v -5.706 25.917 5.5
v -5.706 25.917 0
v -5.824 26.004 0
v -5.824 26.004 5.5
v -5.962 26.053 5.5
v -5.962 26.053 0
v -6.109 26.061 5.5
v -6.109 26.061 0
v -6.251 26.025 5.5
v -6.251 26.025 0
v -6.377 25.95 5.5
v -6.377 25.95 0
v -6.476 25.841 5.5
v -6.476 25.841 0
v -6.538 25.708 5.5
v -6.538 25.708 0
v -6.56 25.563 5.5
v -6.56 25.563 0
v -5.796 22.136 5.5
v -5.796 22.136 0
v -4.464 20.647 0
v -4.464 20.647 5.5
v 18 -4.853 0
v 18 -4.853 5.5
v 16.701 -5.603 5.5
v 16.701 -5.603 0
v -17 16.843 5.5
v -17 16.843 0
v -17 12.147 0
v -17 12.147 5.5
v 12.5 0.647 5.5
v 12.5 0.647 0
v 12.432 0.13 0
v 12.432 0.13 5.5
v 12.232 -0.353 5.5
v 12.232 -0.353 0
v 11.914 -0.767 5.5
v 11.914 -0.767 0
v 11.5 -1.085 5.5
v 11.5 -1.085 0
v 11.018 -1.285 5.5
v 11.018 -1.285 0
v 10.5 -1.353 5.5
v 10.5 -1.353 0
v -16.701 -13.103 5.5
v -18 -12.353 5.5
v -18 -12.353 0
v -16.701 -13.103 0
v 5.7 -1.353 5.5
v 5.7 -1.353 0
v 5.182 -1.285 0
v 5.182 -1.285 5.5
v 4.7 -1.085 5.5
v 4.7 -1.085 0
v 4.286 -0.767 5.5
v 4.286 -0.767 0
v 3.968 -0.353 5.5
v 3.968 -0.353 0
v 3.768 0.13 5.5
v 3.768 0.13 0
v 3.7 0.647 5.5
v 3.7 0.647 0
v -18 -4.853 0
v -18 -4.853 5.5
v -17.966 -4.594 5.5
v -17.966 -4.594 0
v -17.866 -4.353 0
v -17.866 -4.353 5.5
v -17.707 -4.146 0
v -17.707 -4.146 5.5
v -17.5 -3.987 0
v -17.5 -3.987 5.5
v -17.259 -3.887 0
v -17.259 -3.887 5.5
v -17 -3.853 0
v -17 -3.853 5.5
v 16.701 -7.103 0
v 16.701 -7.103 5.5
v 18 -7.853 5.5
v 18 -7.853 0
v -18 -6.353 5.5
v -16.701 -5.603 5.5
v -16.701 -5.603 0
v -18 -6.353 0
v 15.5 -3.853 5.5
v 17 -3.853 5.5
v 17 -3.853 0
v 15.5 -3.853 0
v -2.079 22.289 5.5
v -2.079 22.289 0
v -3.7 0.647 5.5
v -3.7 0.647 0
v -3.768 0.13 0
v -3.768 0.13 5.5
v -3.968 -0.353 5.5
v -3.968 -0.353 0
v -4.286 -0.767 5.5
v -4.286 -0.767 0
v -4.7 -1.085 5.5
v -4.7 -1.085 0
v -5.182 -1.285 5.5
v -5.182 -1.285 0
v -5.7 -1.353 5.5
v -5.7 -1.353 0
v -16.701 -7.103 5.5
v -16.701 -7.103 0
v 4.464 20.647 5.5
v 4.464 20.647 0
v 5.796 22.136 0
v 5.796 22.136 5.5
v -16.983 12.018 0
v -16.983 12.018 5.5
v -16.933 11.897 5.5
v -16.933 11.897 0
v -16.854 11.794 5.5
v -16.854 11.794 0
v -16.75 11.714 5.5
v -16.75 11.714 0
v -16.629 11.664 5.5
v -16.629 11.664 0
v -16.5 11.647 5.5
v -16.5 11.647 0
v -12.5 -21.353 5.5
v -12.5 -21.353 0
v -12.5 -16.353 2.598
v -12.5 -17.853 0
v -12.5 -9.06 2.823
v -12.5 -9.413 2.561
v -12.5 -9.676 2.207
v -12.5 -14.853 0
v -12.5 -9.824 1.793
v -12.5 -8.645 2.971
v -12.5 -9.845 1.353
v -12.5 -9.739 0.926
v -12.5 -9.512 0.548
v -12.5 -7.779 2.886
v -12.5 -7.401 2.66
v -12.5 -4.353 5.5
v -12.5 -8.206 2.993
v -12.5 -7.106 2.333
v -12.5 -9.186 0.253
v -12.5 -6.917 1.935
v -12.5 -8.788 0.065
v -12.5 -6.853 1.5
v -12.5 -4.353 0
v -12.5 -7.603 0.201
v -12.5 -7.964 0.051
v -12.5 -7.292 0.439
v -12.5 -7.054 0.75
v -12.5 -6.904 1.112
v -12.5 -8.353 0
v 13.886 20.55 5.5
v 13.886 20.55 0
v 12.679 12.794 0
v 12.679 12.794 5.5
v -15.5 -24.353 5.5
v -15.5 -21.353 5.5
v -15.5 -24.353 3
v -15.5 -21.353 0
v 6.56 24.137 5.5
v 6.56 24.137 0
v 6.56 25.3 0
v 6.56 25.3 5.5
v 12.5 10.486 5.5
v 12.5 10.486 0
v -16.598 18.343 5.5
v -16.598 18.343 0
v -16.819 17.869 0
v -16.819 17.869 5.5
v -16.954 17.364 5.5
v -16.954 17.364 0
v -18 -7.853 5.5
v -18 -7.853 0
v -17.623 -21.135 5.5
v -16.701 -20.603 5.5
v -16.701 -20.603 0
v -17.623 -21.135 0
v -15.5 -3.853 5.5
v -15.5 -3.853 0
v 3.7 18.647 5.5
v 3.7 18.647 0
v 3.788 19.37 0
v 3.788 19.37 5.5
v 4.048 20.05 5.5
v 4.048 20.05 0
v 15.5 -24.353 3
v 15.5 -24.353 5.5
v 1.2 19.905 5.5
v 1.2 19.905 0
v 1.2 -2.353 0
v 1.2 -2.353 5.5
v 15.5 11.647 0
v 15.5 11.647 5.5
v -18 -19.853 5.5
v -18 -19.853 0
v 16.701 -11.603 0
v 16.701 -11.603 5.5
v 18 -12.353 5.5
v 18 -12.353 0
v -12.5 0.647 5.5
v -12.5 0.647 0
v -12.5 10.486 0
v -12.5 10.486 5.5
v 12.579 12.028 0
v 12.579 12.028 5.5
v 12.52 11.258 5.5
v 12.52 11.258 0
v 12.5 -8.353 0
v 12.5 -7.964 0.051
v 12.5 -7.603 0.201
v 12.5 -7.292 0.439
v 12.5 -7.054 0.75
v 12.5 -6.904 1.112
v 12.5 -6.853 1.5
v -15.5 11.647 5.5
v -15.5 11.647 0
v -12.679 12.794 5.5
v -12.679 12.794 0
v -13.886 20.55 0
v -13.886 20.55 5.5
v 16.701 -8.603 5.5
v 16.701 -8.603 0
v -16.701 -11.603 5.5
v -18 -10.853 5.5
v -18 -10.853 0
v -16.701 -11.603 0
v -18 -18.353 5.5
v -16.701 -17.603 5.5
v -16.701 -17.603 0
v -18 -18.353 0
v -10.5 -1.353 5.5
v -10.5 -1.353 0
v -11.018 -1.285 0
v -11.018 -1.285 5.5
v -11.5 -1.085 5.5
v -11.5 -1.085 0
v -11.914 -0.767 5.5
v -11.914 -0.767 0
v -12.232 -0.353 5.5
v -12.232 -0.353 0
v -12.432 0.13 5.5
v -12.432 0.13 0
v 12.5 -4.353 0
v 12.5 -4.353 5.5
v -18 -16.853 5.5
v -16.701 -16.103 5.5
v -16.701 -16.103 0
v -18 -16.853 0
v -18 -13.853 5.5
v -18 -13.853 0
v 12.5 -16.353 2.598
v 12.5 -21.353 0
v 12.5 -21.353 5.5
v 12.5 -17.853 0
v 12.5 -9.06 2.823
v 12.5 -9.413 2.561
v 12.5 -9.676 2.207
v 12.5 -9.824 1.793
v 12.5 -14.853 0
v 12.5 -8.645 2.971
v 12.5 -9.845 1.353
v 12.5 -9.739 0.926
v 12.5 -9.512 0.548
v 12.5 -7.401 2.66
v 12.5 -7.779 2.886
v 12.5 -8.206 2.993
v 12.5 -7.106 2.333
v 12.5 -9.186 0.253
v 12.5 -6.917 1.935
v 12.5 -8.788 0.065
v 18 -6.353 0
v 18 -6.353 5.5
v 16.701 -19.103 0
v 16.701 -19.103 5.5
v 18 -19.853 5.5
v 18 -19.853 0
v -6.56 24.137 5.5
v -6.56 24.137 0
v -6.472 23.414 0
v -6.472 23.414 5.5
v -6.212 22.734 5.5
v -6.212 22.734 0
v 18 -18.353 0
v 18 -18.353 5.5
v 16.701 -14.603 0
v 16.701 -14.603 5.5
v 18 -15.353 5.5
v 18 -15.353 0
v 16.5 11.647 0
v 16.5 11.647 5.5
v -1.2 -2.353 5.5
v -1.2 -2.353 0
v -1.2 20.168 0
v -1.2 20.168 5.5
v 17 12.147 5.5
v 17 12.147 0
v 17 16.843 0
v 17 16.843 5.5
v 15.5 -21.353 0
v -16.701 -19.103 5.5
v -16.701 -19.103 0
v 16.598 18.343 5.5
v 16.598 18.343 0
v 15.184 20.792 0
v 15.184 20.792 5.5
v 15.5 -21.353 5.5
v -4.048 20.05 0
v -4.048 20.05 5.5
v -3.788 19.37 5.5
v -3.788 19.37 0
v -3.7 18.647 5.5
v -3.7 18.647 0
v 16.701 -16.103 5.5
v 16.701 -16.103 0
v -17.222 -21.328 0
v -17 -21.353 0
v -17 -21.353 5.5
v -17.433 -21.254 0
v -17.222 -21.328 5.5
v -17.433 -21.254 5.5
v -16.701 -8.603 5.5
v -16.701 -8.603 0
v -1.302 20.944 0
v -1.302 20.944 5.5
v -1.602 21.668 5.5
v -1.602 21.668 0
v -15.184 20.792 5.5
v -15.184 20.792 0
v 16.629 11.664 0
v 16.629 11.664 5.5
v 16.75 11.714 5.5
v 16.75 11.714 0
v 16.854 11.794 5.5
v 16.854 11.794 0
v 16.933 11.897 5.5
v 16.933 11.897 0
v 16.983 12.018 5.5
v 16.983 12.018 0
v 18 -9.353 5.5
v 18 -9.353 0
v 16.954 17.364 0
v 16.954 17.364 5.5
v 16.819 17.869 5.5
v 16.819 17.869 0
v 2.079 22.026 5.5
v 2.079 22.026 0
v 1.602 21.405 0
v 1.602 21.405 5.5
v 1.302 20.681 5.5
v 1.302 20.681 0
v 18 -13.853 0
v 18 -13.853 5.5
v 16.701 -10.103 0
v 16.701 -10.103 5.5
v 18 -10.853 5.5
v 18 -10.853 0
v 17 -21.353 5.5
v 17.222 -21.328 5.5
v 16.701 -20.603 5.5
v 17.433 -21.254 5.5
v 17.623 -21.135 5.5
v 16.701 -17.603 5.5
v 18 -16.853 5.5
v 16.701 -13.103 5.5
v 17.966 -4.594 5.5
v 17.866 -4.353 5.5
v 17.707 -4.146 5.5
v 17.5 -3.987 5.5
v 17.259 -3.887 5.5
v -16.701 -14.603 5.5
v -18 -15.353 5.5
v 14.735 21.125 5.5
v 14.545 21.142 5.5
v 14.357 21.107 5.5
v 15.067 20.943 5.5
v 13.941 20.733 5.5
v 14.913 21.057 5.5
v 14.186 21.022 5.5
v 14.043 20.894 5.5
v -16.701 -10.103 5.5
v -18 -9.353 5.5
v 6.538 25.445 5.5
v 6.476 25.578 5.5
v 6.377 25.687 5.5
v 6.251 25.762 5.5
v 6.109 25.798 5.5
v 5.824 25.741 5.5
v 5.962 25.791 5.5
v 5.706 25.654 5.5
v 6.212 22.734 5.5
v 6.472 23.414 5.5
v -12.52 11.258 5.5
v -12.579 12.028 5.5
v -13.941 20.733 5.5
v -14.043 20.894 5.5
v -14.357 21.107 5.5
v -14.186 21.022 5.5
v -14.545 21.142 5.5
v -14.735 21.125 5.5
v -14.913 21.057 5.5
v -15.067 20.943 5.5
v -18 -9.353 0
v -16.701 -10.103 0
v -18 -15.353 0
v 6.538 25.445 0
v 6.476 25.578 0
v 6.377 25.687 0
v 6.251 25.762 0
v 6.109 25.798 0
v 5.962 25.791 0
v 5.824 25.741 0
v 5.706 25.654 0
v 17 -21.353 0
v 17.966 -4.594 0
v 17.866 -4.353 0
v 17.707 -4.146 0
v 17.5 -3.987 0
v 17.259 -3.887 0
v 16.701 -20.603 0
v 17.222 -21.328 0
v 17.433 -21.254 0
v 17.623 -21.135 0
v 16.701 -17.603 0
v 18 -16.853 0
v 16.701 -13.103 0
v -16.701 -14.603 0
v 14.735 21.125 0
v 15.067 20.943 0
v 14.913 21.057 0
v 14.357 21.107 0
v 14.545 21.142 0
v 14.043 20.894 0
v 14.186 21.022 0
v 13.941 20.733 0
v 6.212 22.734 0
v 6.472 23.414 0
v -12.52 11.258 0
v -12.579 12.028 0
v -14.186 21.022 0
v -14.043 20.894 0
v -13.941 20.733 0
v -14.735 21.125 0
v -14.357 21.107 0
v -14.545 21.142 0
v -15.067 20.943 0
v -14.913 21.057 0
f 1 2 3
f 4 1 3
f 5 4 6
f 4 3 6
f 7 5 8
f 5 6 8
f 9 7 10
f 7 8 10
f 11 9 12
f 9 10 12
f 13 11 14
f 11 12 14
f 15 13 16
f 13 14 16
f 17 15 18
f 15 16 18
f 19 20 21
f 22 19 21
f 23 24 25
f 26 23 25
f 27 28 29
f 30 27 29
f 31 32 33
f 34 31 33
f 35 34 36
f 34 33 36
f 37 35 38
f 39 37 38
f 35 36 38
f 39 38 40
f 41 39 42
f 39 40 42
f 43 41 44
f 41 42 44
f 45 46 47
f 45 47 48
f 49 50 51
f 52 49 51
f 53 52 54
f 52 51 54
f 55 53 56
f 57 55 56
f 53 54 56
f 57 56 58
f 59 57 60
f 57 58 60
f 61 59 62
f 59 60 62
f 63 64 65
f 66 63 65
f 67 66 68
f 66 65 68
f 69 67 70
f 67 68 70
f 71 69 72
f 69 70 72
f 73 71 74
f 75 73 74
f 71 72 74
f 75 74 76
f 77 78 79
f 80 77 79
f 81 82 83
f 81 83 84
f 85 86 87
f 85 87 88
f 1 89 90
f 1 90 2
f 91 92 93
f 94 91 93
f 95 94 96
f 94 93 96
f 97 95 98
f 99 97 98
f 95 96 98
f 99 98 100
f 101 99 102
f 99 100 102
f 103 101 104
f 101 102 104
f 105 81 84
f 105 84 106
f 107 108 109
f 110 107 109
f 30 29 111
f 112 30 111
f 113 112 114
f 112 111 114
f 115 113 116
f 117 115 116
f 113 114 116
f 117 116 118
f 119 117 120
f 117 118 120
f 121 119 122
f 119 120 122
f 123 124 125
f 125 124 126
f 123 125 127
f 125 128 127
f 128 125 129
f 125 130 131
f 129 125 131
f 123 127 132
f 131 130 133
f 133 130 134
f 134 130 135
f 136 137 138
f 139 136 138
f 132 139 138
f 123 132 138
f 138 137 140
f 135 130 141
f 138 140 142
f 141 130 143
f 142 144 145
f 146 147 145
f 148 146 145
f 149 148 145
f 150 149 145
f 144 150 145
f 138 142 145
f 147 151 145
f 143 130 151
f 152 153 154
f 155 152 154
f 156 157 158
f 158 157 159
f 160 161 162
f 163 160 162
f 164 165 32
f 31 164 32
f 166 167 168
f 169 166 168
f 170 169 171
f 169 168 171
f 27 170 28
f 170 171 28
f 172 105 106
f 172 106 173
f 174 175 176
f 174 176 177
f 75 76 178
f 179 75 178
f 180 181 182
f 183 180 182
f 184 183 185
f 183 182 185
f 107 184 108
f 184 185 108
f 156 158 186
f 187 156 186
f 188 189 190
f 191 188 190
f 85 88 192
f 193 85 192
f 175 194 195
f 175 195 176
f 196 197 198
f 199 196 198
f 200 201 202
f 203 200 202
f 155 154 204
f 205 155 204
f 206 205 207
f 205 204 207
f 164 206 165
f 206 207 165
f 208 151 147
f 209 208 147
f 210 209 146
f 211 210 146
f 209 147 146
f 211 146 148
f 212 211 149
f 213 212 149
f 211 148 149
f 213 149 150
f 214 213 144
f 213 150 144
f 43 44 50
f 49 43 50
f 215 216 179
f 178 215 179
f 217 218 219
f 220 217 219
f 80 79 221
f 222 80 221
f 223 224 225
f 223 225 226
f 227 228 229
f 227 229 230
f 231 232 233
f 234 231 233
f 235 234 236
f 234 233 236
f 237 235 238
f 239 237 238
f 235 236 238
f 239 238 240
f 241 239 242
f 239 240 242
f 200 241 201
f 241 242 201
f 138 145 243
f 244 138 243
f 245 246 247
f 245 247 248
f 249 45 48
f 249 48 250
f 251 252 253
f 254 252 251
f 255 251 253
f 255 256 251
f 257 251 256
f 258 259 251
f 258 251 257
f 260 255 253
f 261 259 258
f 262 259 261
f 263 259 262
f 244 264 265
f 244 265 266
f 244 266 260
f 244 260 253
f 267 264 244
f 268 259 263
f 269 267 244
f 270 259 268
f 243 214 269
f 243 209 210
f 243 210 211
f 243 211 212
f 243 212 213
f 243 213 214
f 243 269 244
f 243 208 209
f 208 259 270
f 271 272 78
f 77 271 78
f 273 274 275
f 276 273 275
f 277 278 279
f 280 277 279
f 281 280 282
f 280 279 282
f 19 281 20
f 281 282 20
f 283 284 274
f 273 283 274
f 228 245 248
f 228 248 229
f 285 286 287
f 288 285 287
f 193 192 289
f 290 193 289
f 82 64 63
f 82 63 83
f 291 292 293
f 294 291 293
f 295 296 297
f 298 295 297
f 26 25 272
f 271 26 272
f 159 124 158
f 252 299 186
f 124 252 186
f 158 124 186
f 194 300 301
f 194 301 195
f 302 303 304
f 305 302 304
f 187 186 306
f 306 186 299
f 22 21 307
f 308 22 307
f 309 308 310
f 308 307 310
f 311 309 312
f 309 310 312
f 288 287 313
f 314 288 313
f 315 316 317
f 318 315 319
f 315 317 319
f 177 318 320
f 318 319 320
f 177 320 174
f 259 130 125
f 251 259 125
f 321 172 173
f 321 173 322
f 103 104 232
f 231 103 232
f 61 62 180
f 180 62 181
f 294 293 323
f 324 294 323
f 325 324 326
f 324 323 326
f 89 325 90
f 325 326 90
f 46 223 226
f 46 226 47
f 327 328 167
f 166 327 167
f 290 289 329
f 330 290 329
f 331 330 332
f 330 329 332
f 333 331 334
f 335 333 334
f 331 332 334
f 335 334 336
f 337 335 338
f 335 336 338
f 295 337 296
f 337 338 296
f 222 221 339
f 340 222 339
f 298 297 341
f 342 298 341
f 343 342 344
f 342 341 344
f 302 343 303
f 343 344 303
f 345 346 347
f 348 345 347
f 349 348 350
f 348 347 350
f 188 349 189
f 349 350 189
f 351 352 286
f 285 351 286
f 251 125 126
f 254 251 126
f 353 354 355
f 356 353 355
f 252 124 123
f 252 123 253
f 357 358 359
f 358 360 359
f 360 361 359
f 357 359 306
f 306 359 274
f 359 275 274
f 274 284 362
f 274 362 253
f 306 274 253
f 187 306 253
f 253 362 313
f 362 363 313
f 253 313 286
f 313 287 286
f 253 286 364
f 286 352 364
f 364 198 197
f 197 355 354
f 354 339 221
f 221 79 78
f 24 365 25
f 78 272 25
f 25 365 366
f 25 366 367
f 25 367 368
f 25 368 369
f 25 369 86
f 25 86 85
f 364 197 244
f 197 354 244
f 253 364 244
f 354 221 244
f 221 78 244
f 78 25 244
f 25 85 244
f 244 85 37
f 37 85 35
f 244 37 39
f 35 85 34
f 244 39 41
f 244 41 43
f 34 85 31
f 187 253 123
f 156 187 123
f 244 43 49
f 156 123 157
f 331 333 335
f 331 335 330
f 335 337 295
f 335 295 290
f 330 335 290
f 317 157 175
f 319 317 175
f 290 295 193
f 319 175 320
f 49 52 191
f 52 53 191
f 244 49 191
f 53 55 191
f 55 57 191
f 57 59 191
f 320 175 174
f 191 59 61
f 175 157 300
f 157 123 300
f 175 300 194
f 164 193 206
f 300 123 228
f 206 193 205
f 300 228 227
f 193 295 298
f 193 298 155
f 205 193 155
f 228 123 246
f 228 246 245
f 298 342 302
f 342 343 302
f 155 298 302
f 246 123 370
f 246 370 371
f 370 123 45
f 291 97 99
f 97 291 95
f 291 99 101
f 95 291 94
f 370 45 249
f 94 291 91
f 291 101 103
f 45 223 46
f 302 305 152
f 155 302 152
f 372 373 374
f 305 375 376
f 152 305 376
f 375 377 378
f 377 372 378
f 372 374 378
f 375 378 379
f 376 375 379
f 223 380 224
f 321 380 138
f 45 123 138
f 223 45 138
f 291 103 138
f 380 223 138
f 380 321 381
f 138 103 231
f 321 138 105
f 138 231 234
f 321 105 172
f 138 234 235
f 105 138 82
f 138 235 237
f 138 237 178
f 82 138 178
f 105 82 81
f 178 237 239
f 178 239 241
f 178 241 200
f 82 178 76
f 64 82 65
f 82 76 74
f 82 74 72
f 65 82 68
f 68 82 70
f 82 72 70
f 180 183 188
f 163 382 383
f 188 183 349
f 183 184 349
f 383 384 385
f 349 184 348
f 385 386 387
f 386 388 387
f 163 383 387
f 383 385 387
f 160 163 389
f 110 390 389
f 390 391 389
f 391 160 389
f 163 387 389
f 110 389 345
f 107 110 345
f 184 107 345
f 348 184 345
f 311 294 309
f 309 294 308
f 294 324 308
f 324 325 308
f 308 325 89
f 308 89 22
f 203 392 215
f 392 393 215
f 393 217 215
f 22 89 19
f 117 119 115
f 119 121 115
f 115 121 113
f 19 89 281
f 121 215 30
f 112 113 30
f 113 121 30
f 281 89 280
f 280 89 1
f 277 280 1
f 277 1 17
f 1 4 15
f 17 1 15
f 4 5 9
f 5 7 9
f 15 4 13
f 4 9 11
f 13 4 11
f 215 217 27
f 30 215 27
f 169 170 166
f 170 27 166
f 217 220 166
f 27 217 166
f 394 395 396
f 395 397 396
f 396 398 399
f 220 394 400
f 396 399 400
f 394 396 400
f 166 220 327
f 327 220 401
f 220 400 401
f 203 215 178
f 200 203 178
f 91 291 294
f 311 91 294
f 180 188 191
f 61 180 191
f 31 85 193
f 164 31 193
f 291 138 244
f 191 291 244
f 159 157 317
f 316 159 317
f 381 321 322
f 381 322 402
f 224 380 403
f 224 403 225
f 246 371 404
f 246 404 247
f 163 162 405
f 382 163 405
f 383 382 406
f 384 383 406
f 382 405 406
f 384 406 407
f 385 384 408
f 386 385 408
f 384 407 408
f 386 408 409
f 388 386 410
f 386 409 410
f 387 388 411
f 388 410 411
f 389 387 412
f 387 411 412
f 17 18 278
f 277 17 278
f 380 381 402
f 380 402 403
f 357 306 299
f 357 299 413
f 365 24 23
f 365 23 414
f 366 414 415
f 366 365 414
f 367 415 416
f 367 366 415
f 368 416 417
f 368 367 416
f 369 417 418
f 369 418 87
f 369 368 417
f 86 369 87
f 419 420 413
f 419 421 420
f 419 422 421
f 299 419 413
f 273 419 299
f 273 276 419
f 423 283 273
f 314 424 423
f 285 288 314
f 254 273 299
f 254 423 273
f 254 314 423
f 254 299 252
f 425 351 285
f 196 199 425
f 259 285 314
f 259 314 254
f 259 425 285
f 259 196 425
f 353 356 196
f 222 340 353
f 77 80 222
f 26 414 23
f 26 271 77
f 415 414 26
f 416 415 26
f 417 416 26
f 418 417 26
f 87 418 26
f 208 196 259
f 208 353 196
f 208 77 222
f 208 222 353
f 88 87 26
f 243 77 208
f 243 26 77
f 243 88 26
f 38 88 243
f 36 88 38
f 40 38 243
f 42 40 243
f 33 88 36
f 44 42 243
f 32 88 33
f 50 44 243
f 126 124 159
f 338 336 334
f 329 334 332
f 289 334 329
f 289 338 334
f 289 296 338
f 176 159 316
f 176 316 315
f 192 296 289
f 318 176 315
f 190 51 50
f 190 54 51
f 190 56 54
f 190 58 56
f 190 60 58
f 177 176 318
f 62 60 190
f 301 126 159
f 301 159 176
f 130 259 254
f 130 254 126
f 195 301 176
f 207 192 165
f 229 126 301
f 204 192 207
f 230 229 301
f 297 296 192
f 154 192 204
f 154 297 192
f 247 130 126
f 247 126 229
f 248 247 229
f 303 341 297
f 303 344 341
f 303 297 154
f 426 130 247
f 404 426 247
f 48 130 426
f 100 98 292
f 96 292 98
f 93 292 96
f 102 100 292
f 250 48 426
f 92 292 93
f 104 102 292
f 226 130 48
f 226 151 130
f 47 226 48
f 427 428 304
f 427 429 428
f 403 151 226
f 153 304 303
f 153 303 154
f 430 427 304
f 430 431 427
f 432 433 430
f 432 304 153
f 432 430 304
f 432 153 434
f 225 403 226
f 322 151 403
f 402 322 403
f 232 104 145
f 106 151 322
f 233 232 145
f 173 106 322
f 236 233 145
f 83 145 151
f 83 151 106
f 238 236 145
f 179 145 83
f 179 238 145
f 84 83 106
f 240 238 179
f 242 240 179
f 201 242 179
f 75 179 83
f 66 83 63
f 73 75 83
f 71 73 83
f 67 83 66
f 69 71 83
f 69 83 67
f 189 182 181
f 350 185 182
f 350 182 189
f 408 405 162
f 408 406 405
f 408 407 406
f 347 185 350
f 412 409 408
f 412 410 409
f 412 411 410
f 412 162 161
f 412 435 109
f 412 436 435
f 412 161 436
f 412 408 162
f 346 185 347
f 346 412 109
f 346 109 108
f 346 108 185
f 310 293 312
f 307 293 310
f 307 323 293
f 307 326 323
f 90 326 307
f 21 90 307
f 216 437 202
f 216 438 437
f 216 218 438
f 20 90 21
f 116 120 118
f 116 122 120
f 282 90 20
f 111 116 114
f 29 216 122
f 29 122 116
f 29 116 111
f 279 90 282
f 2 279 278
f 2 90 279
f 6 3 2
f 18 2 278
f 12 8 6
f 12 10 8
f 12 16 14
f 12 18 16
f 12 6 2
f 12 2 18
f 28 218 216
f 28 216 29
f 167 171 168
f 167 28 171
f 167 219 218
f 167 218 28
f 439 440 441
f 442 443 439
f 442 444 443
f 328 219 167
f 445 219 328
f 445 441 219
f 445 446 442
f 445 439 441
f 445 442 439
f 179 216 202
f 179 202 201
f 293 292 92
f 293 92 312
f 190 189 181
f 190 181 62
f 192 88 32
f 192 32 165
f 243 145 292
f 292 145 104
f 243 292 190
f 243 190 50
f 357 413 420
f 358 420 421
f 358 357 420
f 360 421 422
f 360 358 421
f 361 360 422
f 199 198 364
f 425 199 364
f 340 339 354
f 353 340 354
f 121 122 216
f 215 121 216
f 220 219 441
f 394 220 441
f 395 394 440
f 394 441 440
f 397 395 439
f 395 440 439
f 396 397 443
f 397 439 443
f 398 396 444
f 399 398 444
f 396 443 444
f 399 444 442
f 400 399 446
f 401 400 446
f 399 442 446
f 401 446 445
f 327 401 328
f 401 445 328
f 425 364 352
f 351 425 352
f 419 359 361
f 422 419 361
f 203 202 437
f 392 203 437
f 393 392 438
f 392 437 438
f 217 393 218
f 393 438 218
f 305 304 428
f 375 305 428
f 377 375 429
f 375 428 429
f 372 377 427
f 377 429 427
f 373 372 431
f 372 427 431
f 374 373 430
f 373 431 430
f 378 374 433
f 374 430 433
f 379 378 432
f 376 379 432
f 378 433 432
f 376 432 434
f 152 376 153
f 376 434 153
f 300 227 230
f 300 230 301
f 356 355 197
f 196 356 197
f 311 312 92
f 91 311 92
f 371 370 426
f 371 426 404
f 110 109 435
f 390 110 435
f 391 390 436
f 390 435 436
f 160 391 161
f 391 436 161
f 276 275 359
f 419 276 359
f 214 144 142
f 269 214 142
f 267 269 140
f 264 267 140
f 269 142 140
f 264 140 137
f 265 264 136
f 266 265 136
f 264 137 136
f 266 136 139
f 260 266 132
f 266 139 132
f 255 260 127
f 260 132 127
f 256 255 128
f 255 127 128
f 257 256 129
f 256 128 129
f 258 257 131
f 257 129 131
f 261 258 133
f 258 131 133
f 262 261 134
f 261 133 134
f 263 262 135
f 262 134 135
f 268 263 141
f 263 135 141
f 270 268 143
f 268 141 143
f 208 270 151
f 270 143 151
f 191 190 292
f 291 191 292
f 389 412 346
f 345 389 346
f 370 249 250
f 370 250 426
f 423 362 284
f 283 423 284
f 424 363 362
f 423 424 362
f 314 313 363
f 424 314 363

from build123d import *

# Parameters (mm, degrees)
F0_W     = 25
F0_H     = 17
F1_DEPTH = 5.5
F3_DEPTH = 25
F5_DEPTH = 32.501
F7_DEPTH = 5.5
F9_DEPTH = 5.501


with BuildPart() as f1:
    # F0 (on Top) → F1 (new body)
    with BuildSketch(Plane.XY):
        with BuildLine():
            Line((-15.5, -24.3527164447), (15.5, -24.3527164447))
            Line((15.5, -24.3527164447), (15.5, 11.6472835553))
            Line((15.5, 11.6472835553), (16.5, 11.6472835553))
            ThreePointArc((16.5, 11.6472835553), (16.8535533906, 11.7937301647), (17, 12.1472835553))
            Line((17, 12.1472835553), (17, 16.843435978))
            ThreePointArc((17, 16.843435978), (16.8977774789, 17.6198931134), (16.5980762114, 18.343435978))
            Line((16.5980762114, 18.343435978), (15.1841674029, 20.7923978715))
            ThreePointArc((15.1841674029, 20.7923978715), (14.4494876631, 21.1305094363), (13.8862846459, 20.5500991403))
            Line((13.8862846459, 20.5500991403), (12.678607693, 12.7943144757))
            ThreePointArc((12.678607693, 12.7943144757), (12.5447185816, 11.6438227741), (12.5, 10.4864301451))
            Line((12.5, 10.4864301451), (12.5, 0.6472835553))
            ThreePointArc((12.5, 0.6472835553), (11.9142135624, -0.766930007), (10.5, -1.3527164447))
            Line((10.5, -1.3527164447), (5.7, -1.3527164447))
            ThreePointArc((5.7, -1.3527164447), (4.2857864376, -0.766930007), (3.7, 0.6472835553))
            Line((3.7, 0.6472835553), (3.7, 18.6472835553))
            ThreePointArc((3.7, 18.6472835553), (3.8975072906, 19.7178136174), (4.4640230758, 20.6473853514))
            Line((4.4640230758, 20.6473853514), (5.7959697488, 22.1364105755))
            ThreePointArc((5.7959697488, 22.1364105755), (6.362485534, 23.0659823095), (6.5599928246, 24.1365123716))
            Line((6.5599928246, 24.1365123716), (6.5599928246, 25.3001695988))
            ThreePointArc((6.5599928246, 25.3001695988), (6.2513345408, 25.762109365), (5.706439434, 25.6537229894))
            Line((5.706439434, 25.6537229894), (2.0786796564, 22.0259632118))
            ThreePointArc((2.0786796564, 22.0259632118), (1.4283614025, 21.0526931653), (1.2, 19.9046428682))
            Line((1.2, 19.9046428682), (1.2, -2.3527164447))
            Line((1.2, -2.3527164447), (-1.2, -2.3527164447))
            Line((-1.2, -2.3527164447), (-1.2, 20.1675462621))
            ThreePointArc((-1.2, 20.1675462621), (-1.4283614025, 21.3155965592), (-2.0786796564, 22.2888666056))
            Line((-2.0786796564, 22.2888666056), (-5.706439434, 25.9166263832))
            ThreePointArc((-5.706439434, 25.9166263832), (-6.2513345408, 26.0250127589), (-6.5599928246, 25.5630729926))
            Line((-6.5599928246, 25.5630729926), (-6.5599928246, 24.1365123716))
            ThreePointArc((-6.5599928246, 24.1365123716), (-6.362485534, 23.0659823095), (-5.7959697488, 22.1364105755))
            Line((-5.7959697488, 22.1364105755), (-4.4640230758, 20.6473853514))
            ThreePointArc((-4.4640230758, 20.6473853514), (-3.8975072906, 19.7178136174), (-3.7, 18.6472835553))
            Line((-3.7, 18.6472835553), (-3.7, 0.6472835553))
            ThreePointArc((-3.7, 0.6472835553), (-4.2857864376, -0.766930007), (-5.7, -1.3527164447))
            Line((-5.7, -1.3527164447), (-10.5, -1.3527164447))
            ThreePointArc((-10.5, -1.3527164447), (-11.9142135624, -0.766930007), (-12.5, 0.6472835553))
            Line((-12.5, 0.6472835553), (-12.5, 10.4864301451))
            ThreePointArc((-12.5, 10.4864301451), (-12.5447185816, 11.6438227741), (-12.678607693, 12.7943144757))
            Line((-12.678607693, 12.7943144757), (-13.8862846459, 20.5500991403))
            ThreePointArc((-13.8862846459, 20.5500991403), (-14.4494876631, 21.1305094363), (-15.1841674029, 20.7923978715))
            Line((-15.1841674029, 20.7923978715), (-16.5980762114, 18.343435978))
            ThreePointArc((-16.5980762114, 18.343435978), (-16.8977774789, 17.6198931134), (-17, 16.843435978))
            Line((-17, 16.843435978), (-17, 12.1472835553))
            ThreePointArc((-17, 12.1472835553), (-16.8535533906, 11.7937301647), (-16.5, 11.6472835553))
            Line((-16.5, 11.6472835553), (-15.5, 11.6472835553))
            Line((-15.5, 11.6472835553), (-15.5, -24.3527164447))
        make_face()
        with Locations((0, -12.8527164447)):
            Rectangle(F0_W, F0_H, mode=Mode.SUBTRACT)
    extrude(amount=F1_DEPTH)

    # F2 (on face) → F3 (join)
    with BuildSketch(Plane.YZ.offset(-12.5)):
        Polygon((-14.8527164447, 0), (-16.3527164447, 2.5980762114), (-17.8527164447, 0), align=None)
        with BuildLine():
            ThreePointArc((-6.8527164447, 1.5), (-9.4133766164, 2.5606601718), (-8.3527164447, 0))
            ThreePointArc((-8.3527164447, 0), (-7.2920562729, 0.4393398282), (-6.8527164447, 1.5))
        make_face()
    extrude(amount=F3_DEPTH)

    # F4 (on face) → F5 (cut, through all)
    with BuildSketch(Plane.YZ.offset(15.5)):
        Polygon((-24.3527164447, 0), (-21.3527164447, 0), (-24.3527164447, 3), align=None)
    extrude(amount=-F5_DEPTH, mode=Mode.SUBTRACT)



with BuildPart() as f7:
    # F6 (on face) → F7 (new body, through all)
    with BuildSketch(Plane.XY.offset(5.5)):
        with BuildLine():
            Line((17, -3.8527164447), (15.5, -3.8527164447))
            Line((15.5, -3.8527164447), (15.5, -21.3527164447))
            Line((15.5, -21.3527164447), (17, -21.3527164447))
            ThreePointArc((17, -21.3527164447), (17.7071067812, -21.0598232258), (18, -20.3527164447))
            Line((18, -20.3527164447), (18, -4.8527164447))
            ThreePointArc((18, -4.8527164447), (17.7071067812, -4.1456096635), (17, -3.8527164447))
        make_face()
    extrude(amount=-F7_DEPTH)

    # F8 (on face) → F9 (cut, through all)
    with BuildSketch(Plane.XY.offset(5.5)):
        Polygon((18, -6.3527164447), (18, -4.8527164447), (16.7009618943, -5.6027164447), align=None)
        Polygon((18, -21.3527164447), (18, -19.8527164447), (16.7009618943, -20.6027164447), align=None)
        Polygon((18, -19.8527164447), (18, -18.3527164447), (16.7009618943, -19.1027164447), align=None)
        Polygon((18, -18.3527164447), (18, -16.8527164447), (16.7009618943, -17.6027164447), align=None)
        Polygon((18, -16.8527164447), (18, -15.3527164447), (16.7009618943, -16.1027164447), align=None)
        Polygon((18, -15.3527164447), (18, -13.8527164447), (16.7009618943, -14.6027164447), align=None)
        Polygon((18, -13.8527164447), (18, -12.3527164447), (16.7009618943, -13.1027164447), align=None)
        Polygon((18, -12.3527164447), (18, -10.8527164447), (16.7009618943, -11.6027164447), align=None)
        Polygon((18, -10.8527164447), (18, -9.3527164447), (16.7009618943, -10.1027164447), align=None)
        Polygon((18, -9.3527164447), (18, -7.8527164447), (16.7009618943, -8.6027164447), align=None)
        Polygon((18, -7.8527164447), (18, -6.3527164447), (16.7009618943, -7.1027164447), align=None)
    extrude(amount=-F9_DEPTH, mode=Mode.SUBTRACT)


with BuildPart() as f1_1:
    add(f1.part)

    add(f7.part)  # F11 merges F7
    # F11: F7 across plane
    add(f7.part.mirror(Plane(origin=(0, -5.9573676074, 2.7906976744), x_dir=(0, 1, 0), z_dir=(1, 0, 0))))


solid = f1_1.part
